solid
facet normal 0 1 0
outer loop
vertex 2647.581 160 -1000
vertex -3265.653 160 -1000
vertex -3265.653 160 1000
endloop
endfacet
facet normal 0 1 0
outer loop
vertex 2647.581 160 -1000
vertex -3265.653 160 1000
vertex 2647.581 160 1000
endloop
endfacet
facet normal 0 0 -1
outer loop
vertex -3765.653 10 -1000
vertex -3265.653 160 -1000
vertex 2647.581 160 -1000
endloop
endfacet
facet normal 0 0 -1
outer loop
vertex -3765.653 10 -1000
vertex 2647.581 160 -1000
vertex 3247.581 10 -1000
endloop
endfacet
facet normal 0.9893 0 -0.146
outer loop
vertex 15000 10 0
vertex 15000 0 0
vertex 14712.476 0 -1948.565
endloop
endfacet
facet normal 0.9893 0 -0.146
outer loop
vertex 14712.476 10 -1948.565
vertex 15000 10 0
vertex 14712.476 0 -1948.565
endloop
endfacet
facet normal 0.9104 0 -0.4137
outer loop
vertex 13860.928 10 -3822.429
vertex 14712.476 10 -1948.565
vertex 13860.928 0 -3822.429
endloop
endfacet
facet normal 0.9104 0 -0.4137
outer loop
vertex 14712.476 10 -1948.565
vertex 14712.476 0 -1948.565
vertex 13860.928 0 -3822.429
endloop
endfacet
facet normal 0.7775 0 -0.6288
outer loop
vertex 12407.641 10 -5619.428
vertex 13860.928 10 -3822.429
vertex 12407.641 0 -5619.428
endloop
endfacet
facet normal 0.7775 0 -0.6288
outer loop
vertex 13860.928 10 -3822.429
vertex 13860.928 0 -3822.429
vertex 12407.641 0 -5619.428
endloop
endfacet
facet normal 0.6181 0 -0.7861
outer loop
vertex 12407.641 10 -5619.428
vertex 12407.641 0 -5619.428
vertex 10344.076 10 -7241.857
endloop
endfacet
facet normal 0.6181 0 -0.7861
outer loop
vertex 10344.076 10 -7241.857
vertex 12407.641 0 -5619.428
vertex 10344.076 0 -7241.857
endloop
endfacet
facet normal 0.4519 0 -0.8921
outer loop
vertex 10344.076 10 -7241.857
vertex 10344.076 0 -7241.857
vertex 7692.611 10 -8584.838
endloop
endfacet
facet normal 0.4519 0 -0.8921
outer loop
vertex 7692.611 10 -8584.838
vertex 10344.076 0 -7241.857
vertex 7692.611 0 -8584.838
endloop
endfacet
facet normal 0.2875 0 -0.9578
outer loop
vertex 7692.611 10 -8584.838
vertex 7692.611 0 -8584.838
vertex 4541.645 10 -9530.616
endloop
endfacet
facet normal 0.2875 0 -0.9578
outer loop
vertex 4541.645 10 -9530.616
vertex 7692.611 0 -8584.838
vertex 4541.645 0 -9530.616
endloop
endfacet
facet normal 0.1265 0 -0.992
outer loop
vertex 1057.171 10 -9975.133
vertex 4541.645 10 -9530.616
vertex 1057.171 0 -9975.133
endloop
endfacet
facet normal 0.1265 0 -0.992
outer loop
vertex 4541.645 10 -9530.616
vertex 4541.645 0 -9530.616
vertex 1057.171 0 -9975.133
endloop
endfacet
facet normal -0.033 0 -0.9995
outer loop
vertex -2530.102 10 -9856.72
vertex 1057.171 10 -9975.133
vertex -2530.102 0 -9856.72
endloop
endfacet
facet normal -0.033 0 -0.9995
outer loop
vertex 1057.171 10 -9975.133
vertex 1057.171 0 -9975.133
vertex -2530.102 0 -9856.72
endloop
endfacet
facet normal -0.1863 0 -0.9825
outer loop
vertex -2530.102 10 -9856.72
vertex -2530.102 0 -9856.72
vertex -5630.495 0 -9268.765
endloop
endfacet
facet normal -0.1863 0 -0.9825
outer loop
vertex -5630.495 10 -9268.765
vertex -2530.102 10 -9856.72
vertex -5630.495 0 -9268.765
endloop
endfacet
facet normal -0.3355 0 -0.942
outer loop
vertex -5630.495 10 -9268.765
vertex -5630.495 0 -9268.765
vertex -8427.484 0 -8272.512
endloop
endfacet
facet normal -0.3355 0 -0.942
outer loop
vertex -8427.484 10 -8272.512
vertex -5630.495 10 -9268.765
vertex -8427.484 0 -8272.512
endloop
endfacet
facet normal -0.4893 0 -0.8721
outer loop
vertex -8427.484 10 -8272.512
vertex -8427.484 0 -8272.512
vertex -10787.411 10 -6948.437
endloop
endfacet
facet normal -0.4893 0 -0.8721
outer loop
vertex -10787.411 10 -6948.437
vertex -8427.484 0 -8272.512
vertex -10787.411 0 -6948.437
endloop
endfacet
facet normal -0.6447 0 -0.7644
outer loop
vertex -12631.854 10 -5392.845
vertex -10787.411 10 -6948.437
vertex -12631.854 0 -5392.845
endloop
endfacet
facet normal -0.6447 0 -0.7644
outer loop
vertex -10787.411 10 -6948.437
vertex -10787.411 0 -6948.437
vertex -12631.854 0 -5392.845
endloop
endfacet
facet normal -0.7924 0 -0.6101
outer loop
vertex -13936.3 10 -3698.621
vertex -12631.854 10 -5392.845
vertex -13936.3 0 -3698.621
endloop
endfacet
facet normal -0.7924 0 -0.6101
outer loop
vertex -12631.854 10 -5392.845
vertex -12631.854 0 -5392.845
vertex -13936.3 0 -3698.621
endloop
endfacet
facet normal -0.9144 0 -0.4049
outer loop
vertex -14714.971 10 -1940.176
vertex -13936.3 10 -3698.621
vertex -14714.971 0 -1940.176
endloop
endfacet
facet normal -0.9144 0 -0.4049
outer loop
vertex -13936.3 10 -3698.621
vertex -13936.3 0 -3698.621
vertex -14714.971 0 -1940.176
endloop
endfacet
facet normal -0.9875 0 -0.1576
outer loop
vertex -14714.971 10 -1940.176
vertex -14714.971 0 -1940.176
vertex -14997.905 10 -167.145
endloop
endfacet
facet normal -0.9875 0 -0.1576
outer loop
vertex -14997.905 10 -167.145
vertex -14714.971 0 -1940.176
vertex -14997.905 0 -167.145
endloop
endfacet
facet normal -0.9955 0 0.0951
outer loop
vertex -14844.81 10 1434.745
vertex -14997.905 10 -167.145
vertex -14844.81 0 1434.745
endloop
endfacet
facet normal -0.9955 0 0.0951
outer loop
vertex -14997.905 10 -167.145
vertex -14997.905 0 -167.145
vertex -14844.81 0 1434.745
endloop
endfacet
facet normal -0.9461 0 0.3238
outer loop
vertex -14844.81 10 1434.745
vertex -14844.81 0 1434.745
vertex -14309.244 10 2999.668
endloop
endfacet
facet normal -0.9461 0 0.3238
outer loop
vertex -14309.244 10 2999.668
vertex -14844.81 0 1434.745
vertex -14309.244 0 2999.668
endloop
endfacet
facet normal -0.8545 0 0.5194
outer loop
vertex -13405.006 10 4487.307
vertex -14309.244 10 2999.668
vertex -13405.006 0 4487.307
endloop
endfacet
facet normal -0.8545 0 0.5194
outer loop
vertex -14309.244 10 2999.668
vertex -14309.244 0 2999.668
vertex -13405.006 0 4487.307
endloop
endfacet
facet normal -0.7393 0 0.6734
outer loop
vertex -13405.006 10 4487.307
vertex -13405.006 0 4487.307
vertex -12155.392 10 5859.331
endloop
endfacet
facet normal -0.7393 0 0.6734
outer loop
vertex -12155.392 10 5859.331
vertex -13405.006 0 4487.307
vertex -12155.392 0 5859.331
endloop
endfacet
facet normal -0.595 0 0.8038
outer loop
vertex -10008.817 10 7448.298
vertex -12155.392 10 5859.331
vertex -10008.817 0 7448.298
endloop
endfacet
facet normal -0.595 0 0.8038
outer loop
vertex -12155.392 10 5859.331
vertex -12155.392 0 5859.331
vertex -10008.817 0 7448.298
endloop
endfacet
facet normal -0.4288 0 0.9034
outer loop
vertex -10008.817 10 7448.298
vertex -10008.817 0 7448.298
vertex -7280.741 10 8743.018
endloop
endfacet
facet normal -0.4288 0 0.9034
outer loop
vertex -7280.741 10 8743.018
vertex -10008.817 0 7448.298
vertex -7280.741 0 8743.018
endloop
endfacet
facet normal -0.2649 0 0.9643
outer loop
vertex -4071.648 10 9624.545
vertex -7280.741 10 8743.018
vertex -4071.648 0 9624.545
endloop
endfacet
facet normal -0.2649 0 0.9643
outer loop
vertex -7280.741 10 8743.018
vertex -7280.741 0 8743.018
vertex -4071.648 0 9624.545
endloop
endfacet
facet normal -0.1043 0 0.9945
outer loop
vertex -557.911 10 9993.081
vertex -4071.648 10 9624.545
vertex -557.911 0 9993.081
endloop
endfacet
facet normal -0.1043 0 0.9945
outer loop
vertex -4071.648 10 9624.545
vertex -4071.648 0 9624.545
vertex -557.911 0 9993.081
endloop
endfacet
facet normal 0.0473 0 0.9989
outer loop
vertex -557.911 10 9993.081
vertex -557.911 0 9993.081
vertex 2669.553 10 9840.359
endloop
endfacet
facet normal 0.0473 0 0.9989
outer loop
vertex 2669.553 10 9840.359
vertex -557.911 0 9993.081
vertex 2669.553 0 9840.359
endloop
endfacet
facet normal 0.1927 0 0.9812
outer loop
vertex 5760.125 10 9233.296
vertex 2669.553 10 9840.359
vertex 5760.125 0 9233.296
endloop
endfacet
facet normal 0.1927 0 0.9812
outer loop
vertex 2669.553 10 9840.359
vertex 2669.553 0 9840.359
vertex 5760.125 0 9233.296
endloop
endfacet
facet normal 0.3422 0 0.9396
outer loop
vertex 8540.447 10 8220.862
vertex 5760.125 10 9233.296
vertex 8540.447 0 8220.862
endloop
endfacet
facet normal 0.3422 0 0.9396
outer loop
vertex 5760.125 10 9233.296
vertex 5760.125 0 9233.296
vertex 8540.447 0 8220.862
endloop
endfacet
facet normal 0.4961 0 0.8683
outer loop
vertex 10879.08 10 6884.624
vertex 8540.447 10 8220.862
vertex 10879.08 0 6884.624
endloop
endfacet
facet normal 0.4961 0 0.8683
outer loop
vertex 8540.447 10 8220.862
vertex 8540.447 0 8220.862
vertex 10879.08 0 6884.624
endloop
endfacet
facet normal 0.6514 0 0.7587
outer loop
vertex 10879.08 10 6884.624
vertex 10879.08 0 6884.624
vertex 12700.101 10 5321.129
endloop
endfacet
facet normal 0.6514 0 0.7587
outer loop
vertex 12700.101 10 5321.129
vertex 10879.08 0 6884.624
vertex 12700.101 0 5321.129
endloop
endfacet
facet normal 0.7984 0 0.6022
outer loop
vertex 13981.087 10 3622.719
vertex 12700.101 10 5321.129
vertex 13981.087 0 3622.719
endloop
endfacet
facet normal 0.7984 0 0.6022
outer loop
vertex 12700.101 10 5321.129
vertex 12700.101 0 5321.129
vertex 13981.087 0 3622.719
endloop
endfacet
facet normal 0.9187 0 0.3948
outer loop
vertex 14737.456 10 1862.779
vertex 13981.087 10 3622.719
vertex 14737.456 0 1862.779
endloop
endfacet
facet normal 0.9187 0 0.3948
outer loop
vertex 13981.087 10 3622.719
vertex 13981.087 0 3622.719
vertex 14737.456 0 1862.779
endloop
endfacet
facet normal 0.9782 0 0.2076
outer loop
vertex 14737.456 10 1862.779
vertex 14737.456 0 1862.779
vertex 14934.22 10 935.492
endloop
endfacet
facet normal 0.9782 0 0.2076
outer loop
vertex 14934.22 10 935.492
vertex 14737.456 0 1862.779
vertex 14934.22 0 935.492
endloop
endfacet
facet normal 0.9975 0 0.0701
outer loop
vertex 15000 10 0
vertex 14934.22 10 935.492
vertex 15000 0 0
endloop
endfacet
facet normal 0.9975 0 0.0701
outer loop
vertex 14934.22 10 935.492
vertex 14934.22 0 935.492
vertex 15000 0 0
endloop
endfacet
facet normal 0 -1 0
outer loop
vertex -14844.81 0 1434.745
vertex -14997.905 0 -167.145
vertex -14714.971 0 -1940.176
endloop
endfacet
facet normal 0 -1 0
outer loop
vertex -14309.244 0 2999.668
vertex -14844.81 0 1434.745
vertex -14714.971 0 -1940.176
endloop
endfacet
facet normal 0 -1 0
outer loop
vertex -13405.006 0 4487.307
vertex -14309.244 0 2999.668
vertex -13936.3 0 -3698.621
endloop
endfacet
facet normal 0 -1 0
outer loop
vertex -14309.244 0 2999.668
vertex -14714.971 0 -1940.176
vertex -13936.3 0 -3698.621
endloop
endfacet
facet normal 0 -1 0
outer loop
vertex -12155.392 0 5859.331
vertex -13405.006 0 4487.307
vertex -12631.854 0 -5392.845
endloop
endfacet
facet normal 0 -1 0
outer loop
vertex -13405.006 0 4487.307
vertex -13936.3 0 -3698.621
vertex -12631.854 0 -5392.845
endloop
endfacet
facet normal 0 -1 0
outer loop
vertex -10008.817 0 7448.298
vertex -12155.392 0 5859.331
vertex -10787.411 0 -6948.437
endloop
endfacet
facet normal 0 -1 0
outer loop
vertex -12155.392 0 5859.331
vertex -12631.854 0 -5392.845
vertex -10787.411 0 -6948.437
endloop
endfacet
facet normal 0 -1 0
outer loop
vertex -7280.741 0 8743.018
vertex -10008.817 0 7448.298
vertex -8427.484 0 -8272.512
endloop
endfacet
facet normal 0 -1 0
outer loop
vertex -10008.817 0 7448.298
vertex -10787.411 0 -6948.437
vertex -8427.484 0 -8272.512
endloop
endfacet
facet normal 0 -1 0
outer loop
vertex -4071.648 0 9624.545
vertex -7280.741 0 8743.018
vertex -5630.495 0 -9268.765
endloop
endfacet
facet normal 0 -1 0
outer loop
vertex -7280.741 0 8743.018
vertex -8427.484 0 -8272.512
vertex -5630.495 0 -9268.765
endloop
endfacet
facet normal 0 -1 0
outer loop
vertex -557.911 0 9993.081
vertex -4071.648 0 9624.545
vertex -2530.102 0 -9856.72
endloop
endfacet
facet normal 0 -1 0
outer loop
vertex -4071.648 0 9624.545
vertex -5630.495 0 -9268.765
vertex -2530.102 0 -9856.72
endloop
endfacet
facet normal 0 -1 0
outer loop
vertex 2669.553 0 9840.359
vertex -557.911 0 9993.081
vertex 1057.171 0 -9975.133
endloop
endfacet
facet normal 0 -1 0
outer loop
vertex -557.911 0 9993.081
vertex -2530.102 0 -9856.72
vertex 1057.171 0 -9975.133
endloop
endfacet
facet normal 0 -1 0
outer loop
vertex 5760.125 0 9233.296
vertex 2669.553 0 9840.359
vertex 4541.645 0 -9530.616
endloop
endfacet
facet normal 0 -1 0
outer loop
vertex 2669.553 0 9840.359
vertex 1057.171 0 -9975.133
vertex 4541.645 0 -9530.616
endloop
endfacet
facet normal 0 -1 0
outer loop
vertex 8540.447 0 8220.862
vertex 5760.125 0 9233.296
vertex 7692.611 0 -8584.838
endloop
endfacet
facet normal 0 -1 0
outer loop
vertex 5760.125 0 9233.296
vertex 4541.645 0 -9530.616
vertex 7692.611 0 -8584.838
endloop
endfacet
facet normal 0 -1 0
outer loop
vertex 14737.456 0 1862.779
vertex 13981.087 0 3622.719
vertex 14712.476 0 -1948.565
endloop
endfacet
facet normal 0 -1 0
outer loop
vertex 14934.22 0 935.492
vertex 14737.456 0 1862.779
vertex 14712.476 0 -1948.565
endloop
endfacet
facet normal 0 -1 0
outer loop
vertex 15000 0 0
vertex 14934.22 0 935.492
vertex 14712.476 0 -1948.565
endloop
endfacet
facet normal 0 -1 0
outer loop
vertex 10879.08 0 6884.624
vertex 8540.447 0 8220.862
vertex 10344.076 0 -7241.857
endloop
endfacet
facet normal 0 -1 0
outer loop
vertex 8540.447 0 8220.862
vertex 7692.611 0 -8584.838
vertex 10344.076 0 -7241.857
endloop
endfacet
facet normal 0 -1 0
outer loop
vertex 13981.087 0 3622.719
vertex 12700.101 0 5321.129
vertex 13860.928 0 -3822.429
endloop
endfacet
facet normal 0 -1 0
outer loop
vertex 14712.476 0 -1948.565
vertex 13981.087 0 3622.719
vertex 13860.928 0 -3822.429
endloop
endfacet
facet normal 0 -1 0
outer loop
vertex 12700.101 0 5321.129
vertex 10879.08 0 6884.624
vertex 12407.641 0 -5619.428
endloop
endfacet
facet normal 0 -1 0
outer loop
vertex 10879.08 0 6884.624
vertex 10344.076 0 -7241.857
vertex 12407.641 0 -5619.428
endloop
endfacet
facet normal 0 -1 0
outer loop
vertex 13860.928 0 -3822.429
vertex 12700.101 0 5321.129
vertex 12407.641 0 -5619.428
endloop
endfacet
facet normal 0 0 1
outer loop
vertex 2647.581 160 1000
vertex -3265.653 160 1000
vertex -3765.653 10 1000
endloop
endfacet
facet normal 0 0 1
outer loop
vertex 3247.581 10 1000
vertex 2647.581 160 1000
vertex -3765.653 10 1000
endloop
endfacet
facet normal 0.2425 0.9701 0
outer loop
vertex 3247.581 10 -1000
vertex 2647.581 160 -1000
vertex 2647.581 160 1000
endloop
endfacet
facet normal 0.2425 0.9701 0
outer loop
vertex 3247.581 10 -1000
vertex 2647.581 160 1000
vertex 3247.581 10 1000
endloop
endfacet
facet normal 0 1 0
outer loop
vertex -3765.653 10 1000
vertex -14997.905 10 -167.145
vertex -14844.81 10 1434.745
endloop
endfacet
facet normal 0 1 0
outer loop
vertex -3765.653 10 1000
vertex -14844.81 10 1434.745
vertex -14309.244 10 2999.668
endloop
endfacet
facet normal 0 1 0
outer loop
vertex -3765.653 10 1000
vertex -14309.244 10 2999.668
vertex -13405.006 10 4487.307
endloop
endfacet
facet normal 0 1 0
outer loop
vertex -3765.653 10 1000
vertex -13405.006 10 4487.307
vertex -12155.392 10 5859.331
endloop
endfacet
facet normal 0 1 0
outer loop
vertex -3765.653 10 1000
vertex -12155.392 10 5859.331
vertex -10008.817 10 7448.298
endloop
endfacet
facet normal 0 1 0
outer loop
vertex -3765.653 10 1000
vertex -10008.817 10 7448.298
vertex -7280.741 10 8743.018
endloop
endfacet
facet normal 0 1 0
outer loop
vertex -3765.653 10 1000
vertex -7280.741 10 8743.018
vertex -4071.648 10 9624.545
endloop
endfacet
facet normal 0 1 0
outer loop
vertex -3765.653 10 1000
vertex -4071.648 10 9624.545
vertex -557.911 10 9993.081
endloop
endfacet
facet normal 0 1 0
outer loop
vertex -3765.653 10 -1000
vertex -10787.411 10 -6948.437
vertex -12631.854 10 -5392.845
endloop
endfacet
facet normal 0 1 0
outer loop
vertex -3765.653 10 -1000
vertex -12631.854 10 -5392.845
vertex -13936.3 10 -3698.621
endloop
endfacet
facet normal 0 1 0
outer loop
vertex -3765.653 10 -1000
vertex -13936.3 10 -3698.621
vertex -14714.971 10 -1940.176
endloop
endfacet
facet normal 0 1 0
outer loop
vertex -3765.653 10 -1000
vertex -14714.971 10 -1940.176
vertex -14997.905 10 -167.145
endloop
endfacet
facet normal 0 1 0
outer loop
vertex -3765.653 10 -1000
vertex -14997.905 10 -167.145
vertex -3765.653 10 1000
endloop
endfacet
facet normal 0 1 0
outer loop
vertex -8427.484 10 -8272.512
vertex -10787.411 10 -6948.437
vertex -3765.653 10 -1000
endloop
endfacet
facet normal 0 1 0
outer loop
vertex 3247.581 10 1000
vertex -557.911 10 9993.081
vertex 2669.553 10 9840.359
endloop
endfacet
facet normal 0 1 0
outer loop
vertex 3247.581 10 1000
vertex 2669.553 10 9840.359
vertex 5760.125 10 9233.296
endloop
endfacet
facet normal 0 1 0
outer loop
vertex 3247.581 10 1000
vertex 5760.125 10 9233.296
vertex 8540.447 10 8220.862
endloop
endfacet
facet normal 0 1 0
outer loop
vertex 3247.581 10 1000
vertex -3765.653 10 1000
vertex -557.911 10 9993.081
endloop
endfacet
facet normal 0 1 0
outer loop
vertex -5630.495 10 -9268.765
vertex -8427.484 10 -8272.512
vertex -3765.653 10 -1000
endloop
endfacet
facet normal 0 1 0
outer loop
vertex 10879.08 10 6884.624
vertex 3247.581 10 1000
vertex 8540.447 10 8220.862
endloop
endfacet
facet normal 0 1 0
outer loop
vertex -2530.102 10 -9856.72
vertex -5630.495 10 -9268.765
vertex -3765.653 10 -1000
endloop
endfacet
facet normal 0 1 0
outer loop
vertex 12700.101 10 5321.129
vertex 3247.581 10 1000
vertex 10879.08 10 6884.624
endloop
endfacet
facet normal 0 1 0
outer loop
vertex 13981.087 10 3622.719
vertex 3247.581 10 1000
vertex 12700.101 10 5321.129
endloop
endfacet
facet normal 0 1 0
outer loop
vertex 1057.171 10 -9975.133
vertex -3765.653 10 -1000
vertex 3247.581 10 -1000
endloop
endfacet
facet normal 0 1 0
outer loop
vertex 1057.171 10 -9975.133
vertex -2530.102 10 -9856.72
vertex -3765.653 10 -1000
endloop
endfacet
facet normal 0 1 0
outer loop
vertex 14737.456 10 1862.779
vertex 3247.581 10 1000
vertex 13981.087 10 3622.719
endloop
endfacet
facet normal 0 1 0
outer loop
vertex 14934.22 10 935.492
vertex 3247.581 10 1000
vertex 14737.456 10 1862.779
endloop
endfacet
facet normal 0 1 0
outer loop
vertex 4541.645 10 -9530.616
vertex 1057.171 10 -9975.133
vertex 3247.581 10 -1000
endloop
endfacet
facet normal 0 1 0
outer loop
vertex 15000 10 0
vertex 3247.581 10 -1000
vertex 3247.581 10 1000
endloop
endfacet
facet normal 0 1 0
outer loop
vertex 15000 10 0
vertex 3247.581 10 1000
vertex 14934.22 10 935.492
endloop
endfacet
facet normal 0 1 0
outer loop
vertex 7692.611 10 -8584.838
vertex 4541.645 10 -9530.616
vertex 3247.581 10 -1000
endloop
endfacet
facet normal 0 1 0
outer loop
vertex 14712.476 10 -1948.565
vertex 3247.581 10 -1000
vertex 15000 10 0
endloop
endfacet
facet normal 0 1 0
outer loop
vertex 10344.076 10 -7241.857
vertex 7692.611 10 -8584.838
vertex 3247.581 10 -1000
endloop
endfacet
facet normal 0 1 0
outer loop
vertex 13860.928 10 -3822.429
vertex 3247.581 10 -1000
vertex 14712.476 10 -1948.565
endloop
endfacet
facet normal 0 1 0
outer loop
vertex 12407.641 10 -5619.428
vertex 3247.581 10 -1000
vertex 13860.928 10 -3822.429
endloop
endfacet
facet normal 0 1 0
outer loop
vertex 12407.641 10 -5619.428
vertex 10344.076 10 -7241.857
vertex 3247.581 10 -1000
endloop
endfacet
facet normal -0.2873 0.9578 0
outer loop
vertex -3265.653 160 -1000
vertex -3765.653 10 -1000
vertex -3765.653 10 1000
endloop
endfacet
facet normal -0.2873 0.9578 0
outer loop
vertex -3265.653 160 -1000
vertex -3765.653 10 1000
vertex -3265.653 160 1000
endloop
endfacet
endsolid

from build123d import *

# Parameters (mm, degrees)
SKETCH_1_RX          = 15000
SKETCH_1_RY          = 10000
EXTRUDE_1_DEPTH      = 10
EXTRUDE_2_DEPTH      = 1000
EXTRUDE_2_DEPTH_BACK = 1000


with BuildPart() as part:
    # 草图1 → 凸台-拉伸1 (new body)
    with BuildSketch(Plane(origin=(0, 0, 0), x_dir=(1, 0, 0), z_dir=(0, 1, 0))):
        with Locations((0, 0)):
            Ellipse(SKETCH_1_RX, SKETCH_1_RY)
    extrude(amount=EXTRUDE_1_DEPTH)

    # 草图4 → 凸台-拉伸2 (add, two sides: drawn at the far end of the back side and taken through both)
    with BuildSketch(Plane.XY.offset(-EXTRUDE_2_DEPTH_BACK)):
        Polygon((-3765.653062208, 10), (-3265.653062208, 160), (2647.580583315, 160), (3247.580583315, 10), align=None)
    extrude(amount=EXTRUDE_2_DEPTH + EXTRUDE_2_DEPTH_BACK)


solid = part.part
